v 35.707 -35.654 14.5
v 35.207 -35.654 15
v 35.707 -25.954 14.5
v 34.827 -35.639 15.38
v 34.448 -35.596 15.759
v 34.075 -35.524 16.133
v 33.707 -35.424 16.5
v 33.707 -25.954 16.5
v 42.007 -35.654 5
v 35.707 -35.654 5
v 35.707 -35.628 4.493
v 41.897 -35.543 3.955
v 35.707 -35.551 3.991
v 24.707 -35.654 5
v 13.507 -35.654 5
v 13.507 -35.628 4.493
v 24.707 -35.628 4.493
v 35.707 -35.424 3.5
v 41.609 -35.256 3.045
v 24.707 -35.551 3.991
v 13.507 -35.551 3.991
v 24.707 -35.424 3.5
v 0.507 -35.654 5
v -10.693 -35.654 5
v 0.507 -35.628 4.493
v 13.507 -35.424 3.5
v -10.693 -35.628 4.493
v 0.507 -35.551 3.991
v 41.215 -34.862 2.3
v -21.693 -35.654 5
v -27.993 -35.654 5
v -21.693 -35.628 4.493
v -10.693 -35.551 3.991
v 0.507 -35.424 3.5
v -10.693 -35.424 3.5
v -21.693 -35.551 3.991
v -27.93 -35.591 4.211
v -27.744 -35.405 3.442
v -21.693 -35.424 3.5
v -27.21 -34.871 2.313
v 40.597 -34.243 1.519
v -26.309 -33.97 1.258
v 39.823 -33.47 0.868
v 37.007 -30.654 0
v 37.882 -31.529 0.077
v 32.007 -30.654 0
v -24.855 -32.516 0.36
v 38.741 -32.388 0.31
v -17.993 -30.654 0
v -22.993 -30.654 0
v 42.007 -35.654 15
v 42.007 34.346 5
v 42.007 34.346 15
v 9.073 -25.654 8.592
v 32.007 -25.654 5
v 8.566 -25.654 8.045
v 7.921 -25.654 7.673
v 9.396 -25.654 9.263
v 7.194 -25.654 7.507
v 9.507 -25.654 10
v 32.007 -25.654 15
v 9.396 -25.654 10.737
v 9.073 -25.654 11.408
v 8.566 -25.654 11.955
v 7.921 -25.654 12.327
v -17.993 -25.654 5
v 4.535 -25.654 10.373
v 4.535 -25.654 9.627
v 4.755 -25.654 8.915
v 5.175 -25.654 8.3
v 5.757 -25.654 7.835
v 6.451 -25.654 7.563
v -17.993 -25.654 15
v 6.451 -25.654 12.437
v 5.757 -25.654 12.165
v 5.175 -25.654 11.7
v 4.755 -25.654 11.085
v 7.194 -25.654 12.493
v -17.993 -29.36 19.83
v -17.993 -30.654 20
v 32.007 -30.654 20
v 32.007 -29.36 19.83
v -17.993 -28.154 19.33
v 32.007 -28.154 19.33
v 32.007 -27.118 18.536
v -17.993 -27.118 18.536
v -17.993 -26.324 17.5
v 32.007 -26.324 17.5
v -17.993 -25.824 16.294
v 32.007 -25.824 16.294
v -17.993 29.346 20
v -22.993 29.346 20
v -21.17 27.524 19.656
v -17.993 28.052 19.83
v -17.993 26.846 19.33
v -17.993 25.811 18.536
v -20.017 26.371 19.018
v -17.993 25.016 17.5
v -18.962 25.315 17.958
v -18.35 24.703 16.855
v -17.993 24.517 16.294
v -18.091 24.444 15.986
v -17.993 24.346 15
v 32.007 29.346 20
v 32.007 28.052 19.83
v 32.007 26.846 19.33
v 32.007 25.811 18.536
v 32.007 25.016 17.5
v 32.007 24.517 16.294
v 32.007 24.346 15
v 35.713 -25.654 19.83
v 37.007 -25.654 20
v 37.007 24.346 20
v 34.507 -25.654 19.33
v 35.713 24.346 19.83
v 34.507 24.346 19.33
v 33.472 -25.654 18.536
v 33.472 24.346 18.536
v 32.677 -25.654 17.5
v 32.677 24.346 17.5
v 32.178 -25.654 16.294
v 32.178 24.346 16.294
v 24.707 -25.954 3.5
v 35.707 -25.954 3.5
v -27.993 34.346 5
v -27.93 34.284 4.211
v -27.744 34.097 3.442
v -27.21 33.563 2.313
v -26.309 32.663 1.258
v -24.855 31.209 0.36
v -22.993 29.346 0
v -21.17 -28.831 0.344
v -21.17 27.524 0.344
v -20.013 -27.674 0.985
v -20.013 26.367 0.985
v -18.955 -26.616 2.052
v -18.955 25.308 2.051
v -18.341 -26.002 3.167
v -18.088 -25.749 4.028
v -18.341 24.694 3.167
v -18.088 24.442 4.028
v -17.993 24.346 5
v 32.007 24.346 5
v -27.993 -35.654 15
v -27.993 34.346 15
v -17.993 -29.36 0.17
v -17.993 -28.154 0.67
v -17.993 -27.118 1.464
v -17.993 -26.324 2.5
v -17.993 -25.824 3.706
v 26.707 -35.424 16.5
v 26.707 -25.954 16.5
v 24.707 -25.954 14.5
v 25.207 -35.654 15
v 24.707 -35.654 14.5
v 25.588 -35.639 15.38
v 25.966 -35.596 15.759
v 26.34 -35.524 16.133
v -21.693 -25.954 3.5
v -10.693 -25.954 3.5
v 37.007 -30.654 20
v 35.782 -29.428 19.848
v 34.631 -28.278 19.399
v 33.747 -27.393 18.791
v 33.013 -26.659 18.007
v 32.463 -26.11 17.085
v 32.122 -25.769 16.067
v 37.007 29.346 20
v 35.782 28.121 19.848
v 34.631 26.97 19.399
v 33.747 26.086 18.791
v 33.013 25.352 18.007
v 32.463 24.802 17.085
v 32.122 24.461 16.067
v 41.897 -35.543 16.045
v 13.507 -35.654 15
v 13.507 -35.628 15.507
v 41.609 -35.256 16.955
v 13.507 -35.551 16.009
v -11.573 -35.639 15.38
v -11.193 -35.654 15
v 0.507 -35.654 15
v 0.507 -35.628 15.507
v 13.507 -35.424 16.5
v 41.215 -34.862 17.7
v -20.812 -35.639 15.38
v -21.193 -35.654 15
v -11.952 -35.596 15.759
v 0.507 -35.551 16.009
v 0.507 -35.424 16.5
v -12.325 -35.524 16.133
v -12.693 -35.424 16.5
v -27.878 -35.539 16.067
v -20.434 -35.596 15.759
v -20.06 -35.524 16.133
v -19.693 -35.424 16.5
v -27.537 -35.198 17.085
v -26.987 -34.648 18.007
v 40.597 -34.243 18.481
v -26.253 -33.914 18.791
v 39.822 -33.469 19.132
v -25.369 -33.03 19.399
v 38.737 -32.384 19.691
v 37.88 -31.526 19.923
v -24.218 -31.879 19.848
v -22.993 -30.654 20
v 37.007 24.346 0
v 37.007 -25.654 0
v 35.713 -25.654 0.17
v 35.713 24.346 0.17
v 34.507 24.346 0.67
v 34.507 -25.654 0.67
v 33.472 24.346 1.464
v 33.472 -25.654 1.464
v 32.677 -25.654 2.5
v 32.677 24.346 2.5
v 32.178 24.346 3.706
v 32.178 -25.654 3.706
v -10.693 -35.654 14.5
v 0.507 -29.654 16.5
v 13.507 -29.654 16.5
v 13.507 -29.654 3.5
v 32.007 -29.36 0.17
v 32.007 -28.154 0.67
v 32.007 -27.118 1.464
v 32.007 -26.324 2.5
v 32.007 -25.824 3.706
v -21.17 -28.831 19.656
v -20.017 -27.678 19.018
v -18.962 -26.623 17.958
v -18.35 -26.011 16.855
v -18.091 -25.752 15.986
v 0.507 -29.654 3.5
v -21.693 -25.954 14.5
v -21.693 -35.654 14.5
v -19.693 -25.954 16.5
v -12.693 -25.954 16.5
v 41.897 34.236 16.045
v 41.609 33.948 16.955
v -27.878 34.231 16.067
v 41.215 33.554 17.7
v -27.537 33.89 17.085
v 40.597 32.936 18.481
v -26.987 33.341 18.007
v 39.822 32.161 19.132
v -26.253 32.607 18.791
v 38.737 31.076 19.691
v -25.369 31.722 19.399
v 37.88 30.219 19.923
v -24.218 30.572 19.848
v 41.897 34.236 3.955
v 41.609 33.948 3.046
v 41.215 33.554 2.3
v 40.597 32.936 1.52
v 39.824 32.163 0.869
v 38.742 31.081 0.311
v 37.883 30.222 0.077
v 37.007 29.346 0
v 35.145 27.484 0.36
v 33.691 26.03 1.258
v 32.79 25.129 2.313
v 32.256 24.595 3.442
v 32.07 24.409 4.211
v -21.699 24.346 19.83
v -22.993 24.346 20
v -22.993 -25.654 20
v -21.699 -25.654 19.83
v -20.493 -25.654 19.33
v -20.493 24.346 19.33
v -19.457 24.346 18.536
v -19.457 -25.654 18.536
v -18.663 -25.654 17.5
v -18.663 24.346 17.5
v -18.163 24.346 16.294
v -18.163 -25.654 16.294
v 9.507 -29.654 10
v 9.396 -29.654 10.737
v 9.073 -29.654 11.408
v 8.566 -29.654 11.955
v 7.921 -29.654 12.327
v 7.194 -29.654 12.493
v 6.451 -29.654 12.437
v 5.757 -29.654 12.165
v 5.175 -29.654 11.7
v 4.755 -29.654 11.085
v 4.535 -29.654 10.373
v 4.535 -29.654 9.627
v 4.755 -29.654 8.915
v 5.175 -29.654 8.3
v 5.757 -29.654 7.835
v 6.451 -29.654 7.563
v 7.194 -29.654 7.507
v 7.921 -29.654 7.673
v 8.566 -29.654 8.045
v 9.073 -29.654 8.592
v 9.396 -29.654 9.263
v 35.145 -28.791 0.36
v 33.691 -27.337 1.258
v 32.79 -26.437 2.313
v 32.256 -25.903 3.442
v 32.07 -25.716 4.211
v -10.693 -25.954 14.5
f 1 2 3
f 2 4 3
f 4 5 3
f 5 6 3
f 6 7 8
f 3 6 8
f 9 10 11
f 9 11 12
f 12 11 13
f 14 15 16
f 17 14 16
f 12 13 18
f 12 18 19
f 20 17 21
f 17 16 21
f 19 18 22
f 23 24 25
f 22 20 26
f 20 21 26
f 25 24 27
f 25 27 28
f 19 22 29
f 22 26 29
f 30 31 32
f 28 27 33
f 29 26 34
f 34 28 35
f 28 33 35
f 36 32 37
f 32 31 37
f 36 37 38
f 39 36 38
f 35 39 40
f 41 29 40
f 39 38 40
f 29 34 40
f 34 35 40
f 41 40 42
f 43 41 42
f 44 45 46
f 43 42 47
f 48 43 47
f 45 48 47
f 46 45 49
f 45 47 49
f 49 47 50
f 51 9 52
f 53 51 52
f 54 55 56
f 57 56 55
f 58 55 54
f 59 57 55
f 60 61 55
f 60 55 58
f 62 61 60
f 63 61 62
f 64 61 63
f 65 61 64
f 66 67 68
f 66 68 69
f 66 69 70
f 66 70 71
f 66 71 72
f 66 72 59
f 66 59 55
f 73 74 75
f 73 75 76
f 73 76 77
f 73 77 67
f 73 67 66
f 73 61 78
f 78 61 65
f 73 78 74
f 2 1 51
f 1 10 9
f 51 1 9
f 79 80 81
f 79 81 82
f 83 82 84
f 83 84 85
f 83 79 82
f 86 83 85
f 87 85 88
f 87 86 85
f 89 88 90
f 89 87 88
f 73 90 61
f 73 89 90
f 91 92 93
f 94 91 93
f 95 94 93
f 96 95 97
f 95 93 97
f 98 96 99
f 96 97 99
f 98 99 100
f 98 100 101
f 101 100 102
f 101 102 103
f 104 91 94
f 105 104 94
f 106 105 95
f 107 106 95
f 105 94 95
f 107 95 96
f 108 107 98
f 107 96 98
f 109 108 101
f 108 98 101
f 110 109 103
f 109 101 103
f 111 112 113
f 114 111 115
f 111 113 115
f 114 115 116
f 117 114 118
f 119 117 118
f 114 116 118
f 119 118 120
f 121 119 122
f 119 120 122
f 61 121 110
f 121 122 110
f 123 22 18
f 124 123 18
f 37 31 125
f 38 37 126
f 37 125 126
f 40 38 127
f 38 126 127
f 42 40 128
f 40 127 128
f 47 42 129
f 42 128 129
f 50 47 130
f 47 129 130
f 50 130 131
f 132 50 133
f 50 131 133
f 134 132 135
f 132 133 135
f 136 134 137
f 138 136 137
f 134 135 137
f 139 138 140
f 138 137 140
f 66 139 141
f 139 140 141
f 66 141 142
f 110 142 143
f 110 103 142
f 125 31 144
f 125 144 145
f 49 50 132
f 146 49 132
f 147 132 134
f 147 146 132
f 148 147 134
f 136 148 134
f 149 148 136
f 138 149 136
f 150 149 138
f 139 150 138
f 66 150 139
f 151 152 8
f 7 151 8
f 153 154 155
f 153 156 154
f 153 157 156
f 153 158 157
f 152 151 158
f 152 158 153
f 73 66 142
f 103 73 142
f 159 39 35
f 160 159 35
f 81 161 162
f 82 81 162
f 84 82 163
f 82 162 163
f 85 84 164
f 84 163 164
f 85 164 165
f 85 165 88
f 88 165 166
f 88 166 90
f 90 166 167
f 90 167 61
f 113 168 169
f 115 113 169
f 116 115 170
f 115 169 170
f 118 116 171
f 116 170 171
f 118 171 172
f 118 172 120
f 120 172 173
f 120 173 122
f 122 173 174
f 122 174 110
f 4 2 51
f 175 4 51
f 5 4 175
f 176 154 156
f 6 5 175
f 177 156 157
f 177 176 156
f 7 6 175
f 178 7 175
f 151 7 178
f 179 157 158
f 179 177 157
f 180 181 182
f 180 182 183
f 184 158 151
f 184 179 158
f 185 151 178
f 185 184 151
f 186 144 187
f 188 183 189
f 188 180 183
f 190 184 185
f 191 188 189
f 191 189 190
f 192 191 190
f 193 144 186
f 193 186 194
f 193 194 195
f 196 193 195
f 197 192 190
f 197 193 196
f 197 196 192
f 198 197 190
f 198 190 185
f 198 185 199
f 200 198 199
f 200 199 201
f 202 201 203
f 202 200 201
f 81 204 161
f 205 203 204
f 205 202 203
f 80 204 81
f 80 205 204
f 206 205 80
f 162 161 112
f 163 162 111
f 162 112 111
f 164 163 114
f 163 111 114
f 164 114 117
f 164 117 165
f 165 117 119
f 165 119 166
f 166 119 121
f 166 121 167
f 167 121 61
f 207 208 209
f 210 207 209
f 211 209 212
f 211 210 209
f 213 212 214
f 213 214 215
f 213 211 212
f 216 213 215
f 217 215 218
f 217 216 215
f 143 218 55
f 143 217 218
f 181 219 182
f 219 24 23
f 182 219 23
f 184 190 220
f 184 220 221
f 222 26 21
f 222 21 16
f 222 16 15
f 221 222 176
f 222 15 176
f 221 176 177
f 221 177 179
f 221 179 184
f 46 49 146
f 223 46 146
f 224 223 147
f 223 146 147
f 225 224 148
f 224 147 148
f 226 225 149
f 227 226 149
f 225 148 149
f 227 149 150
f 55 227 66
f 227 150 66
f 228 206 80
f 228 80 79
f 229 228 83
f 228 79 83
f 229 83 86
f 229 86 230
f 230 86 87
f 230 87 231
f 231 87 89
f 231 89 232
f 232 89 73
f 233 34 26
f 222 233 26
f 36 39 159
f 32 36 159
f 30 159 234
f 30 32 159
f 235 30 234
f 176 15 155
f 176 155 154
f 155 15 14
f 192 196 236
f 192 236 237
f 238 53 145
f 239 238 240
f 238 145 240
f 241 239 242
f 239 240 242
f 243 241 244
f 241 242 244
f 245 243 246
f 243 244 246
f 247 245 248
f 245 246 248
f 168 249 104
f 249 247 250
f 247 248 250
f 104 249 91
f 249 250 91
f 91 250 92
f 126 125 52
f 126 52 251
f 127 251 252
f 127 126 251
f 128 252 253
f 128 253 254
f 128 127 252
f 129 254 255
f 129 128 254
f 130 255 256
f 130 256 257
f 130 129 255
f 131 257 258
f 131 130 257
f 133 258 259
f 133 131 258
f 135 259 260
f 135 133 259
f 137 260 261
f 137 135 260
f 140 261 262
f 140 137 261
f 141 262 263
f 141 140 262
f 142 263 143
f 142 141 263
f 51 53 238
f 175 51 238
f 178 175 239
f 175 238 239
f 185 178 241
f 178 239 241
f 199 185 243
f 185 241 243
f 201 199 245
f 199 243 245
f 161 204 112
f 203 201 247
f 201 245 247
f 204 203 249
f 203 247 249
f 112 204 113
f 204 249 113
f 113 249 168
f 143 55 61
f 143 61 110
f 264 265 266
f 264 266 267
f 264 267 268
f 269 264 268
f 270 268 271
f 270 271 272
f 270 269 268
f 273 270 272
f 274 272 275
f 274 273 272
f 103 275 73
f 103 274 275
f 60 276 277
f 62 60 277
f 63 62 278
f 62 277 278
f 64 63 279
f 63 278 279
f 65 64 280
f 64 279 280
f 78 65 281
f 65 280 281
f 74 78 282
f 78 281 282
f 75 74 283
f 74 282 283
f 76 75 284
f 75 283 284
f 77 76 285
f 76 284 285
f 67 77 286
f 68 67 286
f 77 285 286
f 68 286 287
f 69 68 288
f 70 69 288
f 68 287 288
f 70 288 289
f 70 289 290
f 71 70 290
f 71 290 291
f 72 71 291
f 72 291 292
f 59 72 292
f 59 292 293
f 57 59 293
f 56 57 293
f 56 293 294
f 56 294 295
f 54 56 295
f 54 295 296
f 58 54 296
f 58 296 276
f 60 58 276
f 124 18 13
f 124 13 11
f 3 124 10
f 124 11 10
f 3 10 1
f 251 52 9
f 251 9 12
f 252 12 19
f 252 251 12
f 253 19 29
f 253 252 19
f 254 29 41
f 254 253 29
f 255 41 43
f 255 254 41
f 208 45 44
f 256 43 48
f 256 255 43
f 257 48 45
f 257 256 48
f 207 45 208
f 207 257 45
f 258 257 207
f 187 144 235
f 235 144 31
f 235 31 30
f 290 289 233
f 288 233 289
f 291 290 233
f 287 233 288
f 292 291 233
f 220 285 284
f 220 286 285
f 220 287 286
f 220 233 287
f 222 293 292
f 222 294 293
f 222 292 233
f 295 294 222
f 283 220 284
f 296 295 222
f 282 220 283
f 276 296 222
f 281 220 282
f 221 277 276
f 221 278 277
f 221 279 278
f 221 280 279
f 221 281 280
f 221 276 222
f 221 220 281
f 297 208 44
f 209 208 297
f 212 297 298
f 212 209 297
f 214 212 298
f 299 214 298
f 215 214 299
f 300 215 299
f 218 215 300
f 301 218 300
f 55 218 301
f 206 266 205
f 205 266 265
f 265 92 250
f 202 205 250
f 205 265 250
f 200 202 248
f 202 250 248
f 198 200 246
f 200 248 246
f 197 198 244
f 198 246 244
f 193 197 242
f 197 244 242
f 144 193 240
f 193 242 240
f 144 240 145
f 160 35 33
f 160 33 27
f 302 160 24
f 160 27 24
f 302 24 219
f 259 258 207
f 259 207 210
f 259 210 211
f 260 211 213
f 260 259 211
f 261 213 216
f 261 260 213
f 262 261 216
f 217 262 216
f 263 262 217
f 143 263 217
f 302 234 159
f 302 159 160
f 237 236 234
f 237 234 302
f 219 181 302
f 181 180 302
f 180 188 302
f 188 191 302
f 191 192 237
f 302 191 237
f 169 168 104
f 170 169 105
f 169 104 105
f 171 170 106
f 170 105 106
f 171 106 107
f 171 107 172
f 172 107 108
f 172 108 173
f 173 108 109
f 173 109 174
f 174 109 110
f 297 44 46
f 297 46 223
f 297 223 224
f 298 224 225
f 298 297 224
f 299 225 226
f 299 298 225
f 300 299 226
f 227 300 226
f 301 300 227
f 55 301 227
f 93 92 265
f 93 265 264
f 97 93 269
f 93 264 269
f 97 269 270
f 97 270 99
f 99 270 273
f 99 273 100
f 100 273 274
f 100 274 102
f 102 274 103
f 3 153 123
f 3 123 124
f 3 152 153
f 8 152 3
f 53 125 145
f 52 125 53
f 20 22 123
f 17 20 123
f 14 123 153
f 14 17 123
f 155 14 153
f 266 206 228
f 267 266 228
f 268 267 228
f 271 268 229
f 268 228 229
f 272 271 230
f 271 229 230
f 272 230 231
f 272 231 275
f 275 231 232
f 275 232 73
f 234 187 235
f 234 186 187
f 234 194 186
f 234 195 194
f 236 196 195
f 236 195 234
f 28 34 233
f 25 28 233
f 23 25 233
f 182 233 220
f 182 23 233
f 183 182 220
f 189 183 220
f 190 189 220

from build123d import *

# Parameters (mm, degrees)
F0_W         = 70
F0_H         = 70
F0_W_2       = 50
F0_H_2       = 50
F1_DEPTH     = 20
F2_W         = 13
F2_H         = 13
F3_DEPTH     = 6
F4_T1_DEPTH  = 95
F4_T3_DEPTH  = 95
F4_T5_DEPTH  = 50
F4_T7_DEPTH  = 50
F4_T13_DEPTH = 62.5
F4_T17_DEPTH = 62.5
F4_T24_DEPTH = 62.5
F4_T28_DEPTH = 62.5
F4_T35_DEPTH = 62.5
F4_T39_DEPTH = 62.5
F4_T46_DEPTH = 62.5
F4_T50_DEPTH = 62.5
F4_T57_DEPTH = 62.5
F4_T61_DEPTH = 62.5
F4_T68_DEPTH = 62.5
F4_T72_DEPTH = 62.5
F4_T79_DEPTH = 62.5
F4_T83_DEPTH = 62.5
F4_T90_DEPTH = 62.5
F4_T94_DEPTH = 62.5
F5_R         = 2.5
F6_DEPTH     = 25
F7_W         = 11
F7_H         = 13
F8_DEPTH     = 9.7
F9_SIZE      = 2
F10_SIZE     = 2


# Not quite as in the source:
# - a fillet or chamfer that OpenCascade refuses, or shapes differently, is made with other operations: its cross-section is extruded or revolved along the edge and cut away or added


with BuildPart() as f1:
    # F0 (on Top) → F1 (new body)
    with BuildSketch(Plane.XY):
        with Locations((7.0071799593, -0.6538340822)):
            Rectangle(F0_W, F0_H)
        with Locations((7.0071799593, -0.6538340822)):
            Rectangle(F0_W_2, F0_H_2, mode=Mode.SUBTRACT)
    extrude(amount=F1_DEPTH)

    # F2 (on face) → F3 (cut)
    with BuildSketch(Plane.XZ.offset(35.6538340822)):
        with Locations((7.0071799593, 10)):
            Rectangle(F2_W, F2_H)
    extrude(amount=-F3_DEPTH, mode=Mode.SUBTRACT)

    # F4: fillet of radius 5 on 16 edges, made by hand

    # F4_s2 → F4_t1 (cut)
    with BuildSketch(Plane.XZ.offset(-46.8461659178)):
        with BuildLine():
            ThreePointArc((42.0071799593, 5), (40.5427138653, 1.4644660941), (37.0071799593, 0))
            Line((37.0071799593, 0), (42.0071799593, 0))
            Line((42.0071799593, 0), (42.0071799593, 5))
        make_face()
        with BuildLine():
            ThreePointArc((42.0071799593, 15), (40.5427138653, 18.5355339059), (37.0071799593, 20))
            Line((37.0071799593, 20), (42.0071799593, 20))
            Line((42.0071799593, 20), (42.0071799593, 15))
        make_face()
        with BuildLine():
            ThreePointArc((-22.9928200407, 0), (-26.5283539466, 1.4644660941), (-27.9928200407, 5))
            Line((-27.9928200407, 5), (-27.9928200407, 0))
            Line((-27.9928200407, 0), (-22.9928200407, 0))
        make_face()
        with BuildLine():
            ThreePointArc((-22.9928200407, 20), (-26.5283539466, 18.5355339059), (-27.9928200407, 15))
            Line((-27.9928200407, 15), (-27.9928200407, 20))
            Line((-27.9928200407, 20), (-22.9928200407, 20))
        make_face()
    extrude(amount=F4_T1_DEPTH, mode=Mode.SUBTRACT)

    # F4_s4 → F4_t3 (cut)
    with BuildSketch(Plane.YZ.offset(-40.4928200407)):
        with BuildLine():
            ThreePointArc((-35.6538340822, 5), (-34.1893679881, 1.4644660941), (-30.6538340822, 0))
            Line((-30.6538340822, 0), (-35.6538340822, 0))
            Line((-35.6538340822, 0), (-35.6538340822, 5))
        make_face()
        with BuildLine():
            ThreePointArc((-35.6538340822, 15), (-34.1893679881, 18.5355339059), (-30.6538340822, 20))
            Line((-30.6538340822, 20), (-35.6538340822, 20))
            Line((-35.6538340822, 20), (-35.6538340822, 15))
        make_face()
        with BuildLine():
            ThreePointArc((34.3461659178, 5), (32.8816998237, 1.4644660941), (29.3461659178, 0))
            Line((29.3461659178, 0), (34.3461659178, 0))
            Line((34.3461659178, 0), (34.3461659178, 5))
        make_face()
        with BuildLine():
            ThreePointArc((34.3461659178, 15), (32.8816998237, 18.5355339059), (29.3461659178, 20))
            Line((29.3461659178, 20), (34.3461659178, 20))
            Line((34.3461659178, 20), (34.3461659178, 15))
        make_face()
    extrude(amount=F4_T3_DEPTH, mode=Mode.SUBTRACT)

    # F4_s6 → F4_t5 (cut)
    with BuildSketch(Plane.XZ.offset(-24.3461659178)):
        with BuildLine():
            ThreePointArc((-22.9928200407, 0), (-19.4572861347, 1.4644660941), (-17.9928200407, 5))
            Line((-17.9928200407, 5), (-17.9928200407, 0))
            Line((-17.9928200407, 0), (-22.9928200407, 0))
        make_face()
        with BuildLine():
            ThreePointArc((37.0071799593, 0), (33.4716460534, 1.4644660941), (32.0071799593, 5))
            Line((32.0071799593, 5), (32.0071799593, 0))
            Line((32.0071799593, 0), (37.0071799593, 0))
        make_face()
        with BuildLine():
            ThreePointArc((-22.9928200407, 20), (-19.4572861347, 18.5355339059), (-17.9928200407, 15))
            Line((-17.9928200407, 15), (-17.9928200407, 20))
            Line((-17.9928200407, 20), (-22.9928200407, 20))
        make_face()
        with BuildLine():
            ThreePointArc((37.0071799593, 20), (33.4716460534, 18.5355339059), (32.0071799593, 15))
            Line((32.0071799593, 15), (32.0071799593, 20))
            Line((32.0071799593, 20), (37.0071799593, 20))
        make_face()
    extrude(amount=F4_T5_DEPTH, mode=Mode.SUBTRACT)

    # F4_s8 → F4_t7 (cut)
    with BuildSketch(Plane.YZ.offset(-17.9928200407)):
        with BuildLine():
            ThreePointArc((29.3461659178, 0), (25.8106320119, 1.4644660941), (24.3461659178, 5))
            Line((24.3461659178, 5), (24.3461659178, 0))
            Line((24.3461659178, 0), (29.3461659178, 0))
        make_face()
        with BuildLine():
            ThreePointArc((-30.6538340822, 0), (-27.1183001763, 1.4644660941), (-25.6538340822, 5))
            Line((-25.6538340822, 5), (-25.6538340822, 0))
            Line((-25.6538340822, 0), (-30.6538340822, 0))
        make_face()
        with BuildLine():
            ThreePointArc((29.3461659178, 20), (25.8106320119, 18.5355339059), (24.3461659178, 15))
            Line((24.3461659178, 15), (24.3461659178, 20))
            Line((24.3461659178, 20), (29.3461659178, 20))
        make_face()
        with BuildLine():
            ThreePointArc((-30.6538340822, 20), (-27.1183001763, 18.5355339059), (-25.6538340822, 15))
            Line((-25.6538340822, 15), (-25.6538340822, 20))
            Line((-25.6538340822, 20), (-30.6538340822, 20))
        make_face()
    extrude(amount=F4_T7_DEPTH, mode=Mode.SUBTRACT)


with BuildPart() as f4_tool11:
    # F4_s12 → F4_t13 (new body)
    with BuildSketch(Plane.XZ.offset(38.1538340822)):
        with BuildLine():
            ThreePointArc((-22.9928200407, 0), (-19.4572861347, 1.4644660941), (-17.9928200407, 5))
            Line((-17.9928200407, 5), (-17.9928200407, 0))
            Line((-17.9928200407, 0), (-22.9928200407, 0))
        make_face()
    extrude(amount=-F4_T13_DEPTH)

    split(bisect_by=Plane.XZ.offset(25.6538340822), keep=Keep.TOP)


with BuildPart() as f4_tool15:
    # F4_s16 → F4_t17 (new body)
    with BuildSketch(Plane.YZ.offset(32.0071799593)):
        with BuildLine():
            ThreePointArc((-30.6538340822, 0), (-27.1183001763, 1.4644660941), (-25.6538340822, 5))
            Line((-25.6538340822, 5), (-25.6538340822, 0))
            Line((-25.6538340822, 0), (-30.6538340822, 0))
        make_face()
    extrude(amount=-F4_T17_DEPTH)

    split(bisect_by=Plane.YZ.offset(-17.9928200407), keep=Keep.BOTTOM)


with BuildPart() as f4_tool11_1:
    add(f4_tool11.part)

    # F4_t19: intersect F4_tool15
    add(f4_tool15.part, mode=Mode.INTERSECT)


with BuildPart() as f1_1:
    add(f1.part)

    # F4_t9: cut F4_tool11
    add(f4_tool11_1.part, mode=Mode.SUBTRACT)


with BuildPart() as f4_tool22:
    # F4_s23 → F4_t24 (new body)
    with BuildSketch(Plane.XZ.offset(25.6538340822)):
        with BuildLine():
            ThreePointArc((-22.9928200407, 0), (-19.4572861347, 1.4644660941), (-17.9928200407, 5))
            Line((-17.9928200407, 5), (-17.9928200407, 0))
            Line((-17.9928200407, 0), (-22.9928200407, 0))
        make_face()
    extrude(amount=-F4_T24_DEPTH)

    split(bisect_by=Plane.XZ.offset(-24.3461659178), keep=Keep.BOTTOM)


with BuildPart() as f4_tool26:
    # F4_s27 → F4_t28 (new body)
    with BuildSketch(Plane.YZ.offset(-30.4928200407)):
        with BuildLine():
            ThreePointArc((29.3461659178, 0), (25.8106320119, 1.4644660941), (24.3461659178, 5))
            Line((24.3461659178, 5), (24.3461659178, 0))
            Line((24.3461659178, 0), (29.3461659178, 0))
        make_face()
    extrude(amount=F4_T28_DEPTH)

    split(bisect_by=Plane.YZ.offset(-17.9928200407), keep=Keep.BOTTOM)


with BuildPart() as f4_tool22_1:
    add(f4_tool22.part)

    # F4_t30: intersect F4_tool26
    add(f4_tool26.part, mode=Mode.INTERSECT)


with BuildPart() as f1_2:
    add(f1_1.part)

    # F4_t20: cut F4_tool22
    add(f4_tool22_1.part, mode=Mode.SUBTRACT)


with BuildPart() as f4_tool33:
    # F4_s34 → F4_t35 (new body)
    with BuildSketch(Plane.YZ.offset(-17.9928200407)):
        with BuildLine():
            ThreePointArc((29.3461659178, 0), (25.8106320119, 1.4644660941), (24.3461659178, 5))
            Line((24.3461659178, 5), (24.3461659178, 0))
            Line((24.3461659178, 0), (29.3461659178, 0))
        make_face()
    extrude(amount=F4_T35_DEPTH)

    split(bisect_by=Plane.YZ.offset(32.0071799593), keep=Keep.TOP)


with BuildPart() as f4_tool37:
    # F4_s38 → F4_t39 (new body)
    with BuildSketch(Plane.XZ.offset(-36.8461659178)):
        with BuildLine():
            ThreePointArc((37.0071799593, 0), (33.4716460534, 1.4644660941), (32.0071799593, 5))
            Line((32.0071799593, 5), (32.0071799593, 0))
            Line((32.0071799593, 0), (37.0071799593, 0))
        make_face()
    extrude(amount=F4_T39_DEPTH)

    split(bisect_by=Plane.XZ.offset(-24.3461659178), keep=Keep.BOTTOM)


with BuildPart() as f4_tool33_1:
    add(f4_tool33.part)

    # F4_t41: intersect F4_tool37
    add(f4_tool37.part, mode=Mode.INTERSECT)


with BuildPart() as f1_3:
    add(f1_2.part)

    # F4_t31: cut F4_tool33
    add(f4_tool33_1.part, mode=Mode.SUBTRACT)


with BuildPart() as f4_tool44:
    # F4_s45 → F4_t46 (new body)
    with BuildSketch(Plane.XZ.offset(-24.3461659178)):
        with BuildLine():
            ThreePointArc((37.0071799593, 0), (33.4716460534, 1.4644660941), (32.0071799593, 5))
            Line((32.0071799593, 5), (32.0071799593, 0))
            Line((32.0071799593, 0), (37.0071799593, 0))
        make_face()
    extrude(amount=F4_T46_DEPTH)

    split(bisect_by=Plane.XZ.offset(25.6538340822), keep=Keep.TOP)


with BuildPart() as f4_tool48:
    # F4_s49 → F4_t50 (new body)
    with BuildSketch(Plane.YZ.offset(44.5071799593)):
        with BuildLine():
            ThreePointArc((-30.6538340822, 0), (-27.1183001763, 1.4644660941), (-25.6538340822, 5))
            Line((-25.6538340822, 5), (-25.6538340822, 0))
            Line((-25.6538340822, 0), (-30.6538340822, 0))
        make_face()
    extrude(amount=-F4_T50_DEPTH)

    split(bisect_by=Plane.YZ.offset(32.0071799593), keep=Keep.TOP)


with BuildPart() as f4_tool44_1:
    add(f4_tool44.part)

    # F4_t52: intersect F4_tool48
    add(f4_tool48.part, mode=Mode.INTERSECT)


with BuildPart() as f1_4:
    add(f1_3.part)

    # F4_t42: cut F4_tool44
    add(f4_tool44_1.part, mode=Mode.SUBTRACT)


with BuildPart() as f4_tool55:
    # F4_s56 → F4_t57 (new body)
    with BuildSketch(Plane.XZ.offset(38.1538340822)):
        with BuildLine():
            ThreePointArc((-22.9928200407, 20), (-19.4572861347, 18.5355339059), (-17.9928200407, 15))
            Line((-17.9928200407, 15), (-17.9928200407, 20))
            Line((-17.9928200407, 20), (-22.9928200407, 20))
        make_face()
    extrude(amount=-F4_T57_DEPTH)

    split(bisect_by=Plane.XZ.offset(25.6538340822), keep=Keep.TOP)


with BuildPart() as f4_tool59:
    # F4_s60 → F4_t61 (new body)
    with BuildSketch(Plane.YZ.offset(32.0071799593)):
        with BuildLine():
            ThreePointArc((-30.6538340822, 20), (-27.1183001763, 18.5355339059), (-25.6538340822, 15))
            Line((-25.6538340822, 15), (-25.6538340822, 20))
            Line((-25.6538340822, 20), (-30.6538340822, 20))
        make_face()
    extrude(amount=-F4_T61_DEPTH)

    split(bisect_by=Plane.YZ.offset(-17.9928200407), keep=Keep.BOTTOM)


with BuildPart() as f4_tool55_1:
    add(f4_tool55.part)

    # F4_t63: intersect F4_tool59
    add(f4_tool59.part, mode=Mode.INTERSECT)


with BuildPart() as f1_5:
    add(f1_4.part)

    # F4_t53: cut F4_tool55
    add(f4_tool55_1.part, mode=Mode.SUBTRACT)


with BuildPart() as f4_tool66:
    # F4_s67 → F4_t68 (new body)
    with BuildSketch(Plane.XZ.offset(25.6538340822)):
        with BuildLine():
            ThreePointArc((-22.9928200407, 20), (-19.4572861347, 18.5355339059), (-17.9928200407, 15))
            Line((-17.9928200407, 15), (-17.9928200407, 20))
            Line((-17.9928200407, 20), (-22.9928200407, 20))
        make_face()
    extrude(amount=-F4_T68_DEPTH)

    split(bisect_by=Plane.XZ.offset(-24.3461659178), keep=Keep.BOTTOM)


with BuildPart() as f4_tool70:
    # F4_s71 → F4_t72 (new body)
    with BuildSketch(Plane.YZ.offset(-30.4928200407)):
        with BuildLine():
            ThreePointArc((29.3461659178, 20), (25.8106320119, 18.5355339059), (24.3461659178, 15))
            Line((24.3461659178, 15), (24.3461659178, 20))
            Line((24.3461659178, 20), (29.3461659178, 20))
        make_face()
    extrude(amount=F4_T72_DEPTH)

    split(bisect_by=Plane.YZ.offset(-17.9928200407), keep=Keep.BOTTOM)


with BuildPart() as f4_tool66_1:
    add(f4_tool66.part)

    # F4_t74: intersect F4_tool70
    add(f4_tool70.part, mode=Mode.INTERSECT)


with BuildPart() as f1_6:
    add(f1_5.part)

    # F4_t64: cut F4_tool66
    add(f4_tool66_1.part, mode=Mode.SUBTRACT)


with BuildPart() as f4_tool77:
    # F4_s78 → F4_t79 (new body)
    with BuildSketch(Plane.YZ.offset(-17.9928200407)):
        with BuildLine():
            ThreePointArc((29.3461659178, 20), (25.8106320119, 18.5355339059), (24.3461659178, 15))
            Line((24.3461659178, 15), (24.3461659178, 20))
            Line((24.3461659178, 20), (29.3461659178, 20))
        make_face()
    extrude(amount=F4_T79_DEPTH)

    split(bisect_by=Plane.YZ.offset(32.0071799593), keep=Keep.TOP)


with BuildPart() as f4_tool81:
    # F4_s82 → F4_t83 (new body)
    with BuildSketch(Plane.XZ.offset(-36.8461659178)):
        with BuildLine():
            ThreePointArc((37.0071799593, 20), (33.4716460534, 18.5355339059), (32.0071799593, 15))
            Line((32.0071799593, 15), (32.0071799593, 20))
            Line((32.0071799593, 20), (37.0071799593, 20))
        make_face()
    extrude(amount=F4_T83_DEPTH)

    split(bisect_by=Plane.XZ.offset(-24.3461659178), keep=Keep.BOTTOM)


with BuildPart() as f4_tool77_1:
    add(f4_tool77.part)

    # F4_t85: intersect F4_tool81
    add(f4_tool81.part, mode=Mode.INTERSECT)


with BuildPart() as f1_7:
    add(f1_6.part)

    # F4_t75: cut F4_tool77
    add(f4_tool77_1.part, mode=Mode.SUBTRACT)


with BuildPart() as f4_tool88:
    # F4_s89 → F4_t90 (new body)
    with BuildSketch(Plane.XZ.offset(-24.3461659178)):
        with BuildLine():
            ThreePointArc((37.0071799593, 20), (33.4716460534, 18.5355339059), (32.0071799593, 15))
            Line((32.0071799593, 15), (32.0071799593, 20))
            Line((32.0071799593, 20), (37.0071799593, 20))
        make_face()
    extrude(amount=F4_T90_DEPTH)

    split(bisect_by=Plane.XZ.offset(25.6538340822), keep=Keep.TOP)


with BuildPart() as f4_tool92:
    # F4_s93 → F4_t94 (new body)
    with BuildSketch(Plane.YZ.offset(44.5071799593)):
        with BuildLine():
            ThreePointArc((-30.6538340822, 20), (-27.1183001763, 18.5355339059), (-25.6538340822, 15))
            Line((-25.6538340822, 15), (-25.6538340822, 20))
            Line((-25.6538340822, 20), (-30.6538340822, 20))
        make_face()
    extrude(amount=-F4_T94_DEPTH)

    split(bisect_by=Plane.YZ.offset(32.0071799593), keep=Keep.TOP)


with BuildPart() as f4_tool88_1:
    add(f4_tool88.part)

    # F4_t96: intersect F4_tool92
    add(f4_tool92.part, mode=Mode.INTERSECT)


with BuildPart() as f1_8:
    add(f1_7.part)

    # F4_t86: cut F4_tool88
    add(f4_tool88_1.part, mode=Mode.SUBTRACT)

    # F5 (on face) → F6 (cut)
    with BuildSketch(Plane.XZ.offset(29.6538340822)):
        with Locations((7.0071799593, 10)):
            Circle(F5_R)
    extrude(amount=-F6_DEPTH, mode=Mode.SUBTRACT)

    # F7 (on face) → F8 (cut)
    with BuildSketch(Plane.XZ.offset(35.6538340822)):
        with Locations((-16.1928200407, 10)):
            Rectangle(F7_W, F7_H)
        with Locations((30.2071799593, 10)):
            Rectangle(F7_W, F7_H)
    extrude(amount=-F8_DEPTH, mode=Mode.SUBTRACT)

    # F9
    f9_edges = [f1_8.edges().sort_by_distance(p)[0] for p in [
        (-21.69282, -30.688682, 16.5),
        (-10.69282, -30.688682, 16.5),
    ]]
    chamfer(f9_edges, length=F9_SIZE)

    # F10
    f10_edges = [f1_8.edges().sort_by_distance(p)[0] for p in [
        (35.70718, -30.688682, 16.5),
        (24.70718, -30.688682, 16.5),
    ]]
    chamfer(f10_edges, length=F10_SIZE)


solid = f1_8.part
